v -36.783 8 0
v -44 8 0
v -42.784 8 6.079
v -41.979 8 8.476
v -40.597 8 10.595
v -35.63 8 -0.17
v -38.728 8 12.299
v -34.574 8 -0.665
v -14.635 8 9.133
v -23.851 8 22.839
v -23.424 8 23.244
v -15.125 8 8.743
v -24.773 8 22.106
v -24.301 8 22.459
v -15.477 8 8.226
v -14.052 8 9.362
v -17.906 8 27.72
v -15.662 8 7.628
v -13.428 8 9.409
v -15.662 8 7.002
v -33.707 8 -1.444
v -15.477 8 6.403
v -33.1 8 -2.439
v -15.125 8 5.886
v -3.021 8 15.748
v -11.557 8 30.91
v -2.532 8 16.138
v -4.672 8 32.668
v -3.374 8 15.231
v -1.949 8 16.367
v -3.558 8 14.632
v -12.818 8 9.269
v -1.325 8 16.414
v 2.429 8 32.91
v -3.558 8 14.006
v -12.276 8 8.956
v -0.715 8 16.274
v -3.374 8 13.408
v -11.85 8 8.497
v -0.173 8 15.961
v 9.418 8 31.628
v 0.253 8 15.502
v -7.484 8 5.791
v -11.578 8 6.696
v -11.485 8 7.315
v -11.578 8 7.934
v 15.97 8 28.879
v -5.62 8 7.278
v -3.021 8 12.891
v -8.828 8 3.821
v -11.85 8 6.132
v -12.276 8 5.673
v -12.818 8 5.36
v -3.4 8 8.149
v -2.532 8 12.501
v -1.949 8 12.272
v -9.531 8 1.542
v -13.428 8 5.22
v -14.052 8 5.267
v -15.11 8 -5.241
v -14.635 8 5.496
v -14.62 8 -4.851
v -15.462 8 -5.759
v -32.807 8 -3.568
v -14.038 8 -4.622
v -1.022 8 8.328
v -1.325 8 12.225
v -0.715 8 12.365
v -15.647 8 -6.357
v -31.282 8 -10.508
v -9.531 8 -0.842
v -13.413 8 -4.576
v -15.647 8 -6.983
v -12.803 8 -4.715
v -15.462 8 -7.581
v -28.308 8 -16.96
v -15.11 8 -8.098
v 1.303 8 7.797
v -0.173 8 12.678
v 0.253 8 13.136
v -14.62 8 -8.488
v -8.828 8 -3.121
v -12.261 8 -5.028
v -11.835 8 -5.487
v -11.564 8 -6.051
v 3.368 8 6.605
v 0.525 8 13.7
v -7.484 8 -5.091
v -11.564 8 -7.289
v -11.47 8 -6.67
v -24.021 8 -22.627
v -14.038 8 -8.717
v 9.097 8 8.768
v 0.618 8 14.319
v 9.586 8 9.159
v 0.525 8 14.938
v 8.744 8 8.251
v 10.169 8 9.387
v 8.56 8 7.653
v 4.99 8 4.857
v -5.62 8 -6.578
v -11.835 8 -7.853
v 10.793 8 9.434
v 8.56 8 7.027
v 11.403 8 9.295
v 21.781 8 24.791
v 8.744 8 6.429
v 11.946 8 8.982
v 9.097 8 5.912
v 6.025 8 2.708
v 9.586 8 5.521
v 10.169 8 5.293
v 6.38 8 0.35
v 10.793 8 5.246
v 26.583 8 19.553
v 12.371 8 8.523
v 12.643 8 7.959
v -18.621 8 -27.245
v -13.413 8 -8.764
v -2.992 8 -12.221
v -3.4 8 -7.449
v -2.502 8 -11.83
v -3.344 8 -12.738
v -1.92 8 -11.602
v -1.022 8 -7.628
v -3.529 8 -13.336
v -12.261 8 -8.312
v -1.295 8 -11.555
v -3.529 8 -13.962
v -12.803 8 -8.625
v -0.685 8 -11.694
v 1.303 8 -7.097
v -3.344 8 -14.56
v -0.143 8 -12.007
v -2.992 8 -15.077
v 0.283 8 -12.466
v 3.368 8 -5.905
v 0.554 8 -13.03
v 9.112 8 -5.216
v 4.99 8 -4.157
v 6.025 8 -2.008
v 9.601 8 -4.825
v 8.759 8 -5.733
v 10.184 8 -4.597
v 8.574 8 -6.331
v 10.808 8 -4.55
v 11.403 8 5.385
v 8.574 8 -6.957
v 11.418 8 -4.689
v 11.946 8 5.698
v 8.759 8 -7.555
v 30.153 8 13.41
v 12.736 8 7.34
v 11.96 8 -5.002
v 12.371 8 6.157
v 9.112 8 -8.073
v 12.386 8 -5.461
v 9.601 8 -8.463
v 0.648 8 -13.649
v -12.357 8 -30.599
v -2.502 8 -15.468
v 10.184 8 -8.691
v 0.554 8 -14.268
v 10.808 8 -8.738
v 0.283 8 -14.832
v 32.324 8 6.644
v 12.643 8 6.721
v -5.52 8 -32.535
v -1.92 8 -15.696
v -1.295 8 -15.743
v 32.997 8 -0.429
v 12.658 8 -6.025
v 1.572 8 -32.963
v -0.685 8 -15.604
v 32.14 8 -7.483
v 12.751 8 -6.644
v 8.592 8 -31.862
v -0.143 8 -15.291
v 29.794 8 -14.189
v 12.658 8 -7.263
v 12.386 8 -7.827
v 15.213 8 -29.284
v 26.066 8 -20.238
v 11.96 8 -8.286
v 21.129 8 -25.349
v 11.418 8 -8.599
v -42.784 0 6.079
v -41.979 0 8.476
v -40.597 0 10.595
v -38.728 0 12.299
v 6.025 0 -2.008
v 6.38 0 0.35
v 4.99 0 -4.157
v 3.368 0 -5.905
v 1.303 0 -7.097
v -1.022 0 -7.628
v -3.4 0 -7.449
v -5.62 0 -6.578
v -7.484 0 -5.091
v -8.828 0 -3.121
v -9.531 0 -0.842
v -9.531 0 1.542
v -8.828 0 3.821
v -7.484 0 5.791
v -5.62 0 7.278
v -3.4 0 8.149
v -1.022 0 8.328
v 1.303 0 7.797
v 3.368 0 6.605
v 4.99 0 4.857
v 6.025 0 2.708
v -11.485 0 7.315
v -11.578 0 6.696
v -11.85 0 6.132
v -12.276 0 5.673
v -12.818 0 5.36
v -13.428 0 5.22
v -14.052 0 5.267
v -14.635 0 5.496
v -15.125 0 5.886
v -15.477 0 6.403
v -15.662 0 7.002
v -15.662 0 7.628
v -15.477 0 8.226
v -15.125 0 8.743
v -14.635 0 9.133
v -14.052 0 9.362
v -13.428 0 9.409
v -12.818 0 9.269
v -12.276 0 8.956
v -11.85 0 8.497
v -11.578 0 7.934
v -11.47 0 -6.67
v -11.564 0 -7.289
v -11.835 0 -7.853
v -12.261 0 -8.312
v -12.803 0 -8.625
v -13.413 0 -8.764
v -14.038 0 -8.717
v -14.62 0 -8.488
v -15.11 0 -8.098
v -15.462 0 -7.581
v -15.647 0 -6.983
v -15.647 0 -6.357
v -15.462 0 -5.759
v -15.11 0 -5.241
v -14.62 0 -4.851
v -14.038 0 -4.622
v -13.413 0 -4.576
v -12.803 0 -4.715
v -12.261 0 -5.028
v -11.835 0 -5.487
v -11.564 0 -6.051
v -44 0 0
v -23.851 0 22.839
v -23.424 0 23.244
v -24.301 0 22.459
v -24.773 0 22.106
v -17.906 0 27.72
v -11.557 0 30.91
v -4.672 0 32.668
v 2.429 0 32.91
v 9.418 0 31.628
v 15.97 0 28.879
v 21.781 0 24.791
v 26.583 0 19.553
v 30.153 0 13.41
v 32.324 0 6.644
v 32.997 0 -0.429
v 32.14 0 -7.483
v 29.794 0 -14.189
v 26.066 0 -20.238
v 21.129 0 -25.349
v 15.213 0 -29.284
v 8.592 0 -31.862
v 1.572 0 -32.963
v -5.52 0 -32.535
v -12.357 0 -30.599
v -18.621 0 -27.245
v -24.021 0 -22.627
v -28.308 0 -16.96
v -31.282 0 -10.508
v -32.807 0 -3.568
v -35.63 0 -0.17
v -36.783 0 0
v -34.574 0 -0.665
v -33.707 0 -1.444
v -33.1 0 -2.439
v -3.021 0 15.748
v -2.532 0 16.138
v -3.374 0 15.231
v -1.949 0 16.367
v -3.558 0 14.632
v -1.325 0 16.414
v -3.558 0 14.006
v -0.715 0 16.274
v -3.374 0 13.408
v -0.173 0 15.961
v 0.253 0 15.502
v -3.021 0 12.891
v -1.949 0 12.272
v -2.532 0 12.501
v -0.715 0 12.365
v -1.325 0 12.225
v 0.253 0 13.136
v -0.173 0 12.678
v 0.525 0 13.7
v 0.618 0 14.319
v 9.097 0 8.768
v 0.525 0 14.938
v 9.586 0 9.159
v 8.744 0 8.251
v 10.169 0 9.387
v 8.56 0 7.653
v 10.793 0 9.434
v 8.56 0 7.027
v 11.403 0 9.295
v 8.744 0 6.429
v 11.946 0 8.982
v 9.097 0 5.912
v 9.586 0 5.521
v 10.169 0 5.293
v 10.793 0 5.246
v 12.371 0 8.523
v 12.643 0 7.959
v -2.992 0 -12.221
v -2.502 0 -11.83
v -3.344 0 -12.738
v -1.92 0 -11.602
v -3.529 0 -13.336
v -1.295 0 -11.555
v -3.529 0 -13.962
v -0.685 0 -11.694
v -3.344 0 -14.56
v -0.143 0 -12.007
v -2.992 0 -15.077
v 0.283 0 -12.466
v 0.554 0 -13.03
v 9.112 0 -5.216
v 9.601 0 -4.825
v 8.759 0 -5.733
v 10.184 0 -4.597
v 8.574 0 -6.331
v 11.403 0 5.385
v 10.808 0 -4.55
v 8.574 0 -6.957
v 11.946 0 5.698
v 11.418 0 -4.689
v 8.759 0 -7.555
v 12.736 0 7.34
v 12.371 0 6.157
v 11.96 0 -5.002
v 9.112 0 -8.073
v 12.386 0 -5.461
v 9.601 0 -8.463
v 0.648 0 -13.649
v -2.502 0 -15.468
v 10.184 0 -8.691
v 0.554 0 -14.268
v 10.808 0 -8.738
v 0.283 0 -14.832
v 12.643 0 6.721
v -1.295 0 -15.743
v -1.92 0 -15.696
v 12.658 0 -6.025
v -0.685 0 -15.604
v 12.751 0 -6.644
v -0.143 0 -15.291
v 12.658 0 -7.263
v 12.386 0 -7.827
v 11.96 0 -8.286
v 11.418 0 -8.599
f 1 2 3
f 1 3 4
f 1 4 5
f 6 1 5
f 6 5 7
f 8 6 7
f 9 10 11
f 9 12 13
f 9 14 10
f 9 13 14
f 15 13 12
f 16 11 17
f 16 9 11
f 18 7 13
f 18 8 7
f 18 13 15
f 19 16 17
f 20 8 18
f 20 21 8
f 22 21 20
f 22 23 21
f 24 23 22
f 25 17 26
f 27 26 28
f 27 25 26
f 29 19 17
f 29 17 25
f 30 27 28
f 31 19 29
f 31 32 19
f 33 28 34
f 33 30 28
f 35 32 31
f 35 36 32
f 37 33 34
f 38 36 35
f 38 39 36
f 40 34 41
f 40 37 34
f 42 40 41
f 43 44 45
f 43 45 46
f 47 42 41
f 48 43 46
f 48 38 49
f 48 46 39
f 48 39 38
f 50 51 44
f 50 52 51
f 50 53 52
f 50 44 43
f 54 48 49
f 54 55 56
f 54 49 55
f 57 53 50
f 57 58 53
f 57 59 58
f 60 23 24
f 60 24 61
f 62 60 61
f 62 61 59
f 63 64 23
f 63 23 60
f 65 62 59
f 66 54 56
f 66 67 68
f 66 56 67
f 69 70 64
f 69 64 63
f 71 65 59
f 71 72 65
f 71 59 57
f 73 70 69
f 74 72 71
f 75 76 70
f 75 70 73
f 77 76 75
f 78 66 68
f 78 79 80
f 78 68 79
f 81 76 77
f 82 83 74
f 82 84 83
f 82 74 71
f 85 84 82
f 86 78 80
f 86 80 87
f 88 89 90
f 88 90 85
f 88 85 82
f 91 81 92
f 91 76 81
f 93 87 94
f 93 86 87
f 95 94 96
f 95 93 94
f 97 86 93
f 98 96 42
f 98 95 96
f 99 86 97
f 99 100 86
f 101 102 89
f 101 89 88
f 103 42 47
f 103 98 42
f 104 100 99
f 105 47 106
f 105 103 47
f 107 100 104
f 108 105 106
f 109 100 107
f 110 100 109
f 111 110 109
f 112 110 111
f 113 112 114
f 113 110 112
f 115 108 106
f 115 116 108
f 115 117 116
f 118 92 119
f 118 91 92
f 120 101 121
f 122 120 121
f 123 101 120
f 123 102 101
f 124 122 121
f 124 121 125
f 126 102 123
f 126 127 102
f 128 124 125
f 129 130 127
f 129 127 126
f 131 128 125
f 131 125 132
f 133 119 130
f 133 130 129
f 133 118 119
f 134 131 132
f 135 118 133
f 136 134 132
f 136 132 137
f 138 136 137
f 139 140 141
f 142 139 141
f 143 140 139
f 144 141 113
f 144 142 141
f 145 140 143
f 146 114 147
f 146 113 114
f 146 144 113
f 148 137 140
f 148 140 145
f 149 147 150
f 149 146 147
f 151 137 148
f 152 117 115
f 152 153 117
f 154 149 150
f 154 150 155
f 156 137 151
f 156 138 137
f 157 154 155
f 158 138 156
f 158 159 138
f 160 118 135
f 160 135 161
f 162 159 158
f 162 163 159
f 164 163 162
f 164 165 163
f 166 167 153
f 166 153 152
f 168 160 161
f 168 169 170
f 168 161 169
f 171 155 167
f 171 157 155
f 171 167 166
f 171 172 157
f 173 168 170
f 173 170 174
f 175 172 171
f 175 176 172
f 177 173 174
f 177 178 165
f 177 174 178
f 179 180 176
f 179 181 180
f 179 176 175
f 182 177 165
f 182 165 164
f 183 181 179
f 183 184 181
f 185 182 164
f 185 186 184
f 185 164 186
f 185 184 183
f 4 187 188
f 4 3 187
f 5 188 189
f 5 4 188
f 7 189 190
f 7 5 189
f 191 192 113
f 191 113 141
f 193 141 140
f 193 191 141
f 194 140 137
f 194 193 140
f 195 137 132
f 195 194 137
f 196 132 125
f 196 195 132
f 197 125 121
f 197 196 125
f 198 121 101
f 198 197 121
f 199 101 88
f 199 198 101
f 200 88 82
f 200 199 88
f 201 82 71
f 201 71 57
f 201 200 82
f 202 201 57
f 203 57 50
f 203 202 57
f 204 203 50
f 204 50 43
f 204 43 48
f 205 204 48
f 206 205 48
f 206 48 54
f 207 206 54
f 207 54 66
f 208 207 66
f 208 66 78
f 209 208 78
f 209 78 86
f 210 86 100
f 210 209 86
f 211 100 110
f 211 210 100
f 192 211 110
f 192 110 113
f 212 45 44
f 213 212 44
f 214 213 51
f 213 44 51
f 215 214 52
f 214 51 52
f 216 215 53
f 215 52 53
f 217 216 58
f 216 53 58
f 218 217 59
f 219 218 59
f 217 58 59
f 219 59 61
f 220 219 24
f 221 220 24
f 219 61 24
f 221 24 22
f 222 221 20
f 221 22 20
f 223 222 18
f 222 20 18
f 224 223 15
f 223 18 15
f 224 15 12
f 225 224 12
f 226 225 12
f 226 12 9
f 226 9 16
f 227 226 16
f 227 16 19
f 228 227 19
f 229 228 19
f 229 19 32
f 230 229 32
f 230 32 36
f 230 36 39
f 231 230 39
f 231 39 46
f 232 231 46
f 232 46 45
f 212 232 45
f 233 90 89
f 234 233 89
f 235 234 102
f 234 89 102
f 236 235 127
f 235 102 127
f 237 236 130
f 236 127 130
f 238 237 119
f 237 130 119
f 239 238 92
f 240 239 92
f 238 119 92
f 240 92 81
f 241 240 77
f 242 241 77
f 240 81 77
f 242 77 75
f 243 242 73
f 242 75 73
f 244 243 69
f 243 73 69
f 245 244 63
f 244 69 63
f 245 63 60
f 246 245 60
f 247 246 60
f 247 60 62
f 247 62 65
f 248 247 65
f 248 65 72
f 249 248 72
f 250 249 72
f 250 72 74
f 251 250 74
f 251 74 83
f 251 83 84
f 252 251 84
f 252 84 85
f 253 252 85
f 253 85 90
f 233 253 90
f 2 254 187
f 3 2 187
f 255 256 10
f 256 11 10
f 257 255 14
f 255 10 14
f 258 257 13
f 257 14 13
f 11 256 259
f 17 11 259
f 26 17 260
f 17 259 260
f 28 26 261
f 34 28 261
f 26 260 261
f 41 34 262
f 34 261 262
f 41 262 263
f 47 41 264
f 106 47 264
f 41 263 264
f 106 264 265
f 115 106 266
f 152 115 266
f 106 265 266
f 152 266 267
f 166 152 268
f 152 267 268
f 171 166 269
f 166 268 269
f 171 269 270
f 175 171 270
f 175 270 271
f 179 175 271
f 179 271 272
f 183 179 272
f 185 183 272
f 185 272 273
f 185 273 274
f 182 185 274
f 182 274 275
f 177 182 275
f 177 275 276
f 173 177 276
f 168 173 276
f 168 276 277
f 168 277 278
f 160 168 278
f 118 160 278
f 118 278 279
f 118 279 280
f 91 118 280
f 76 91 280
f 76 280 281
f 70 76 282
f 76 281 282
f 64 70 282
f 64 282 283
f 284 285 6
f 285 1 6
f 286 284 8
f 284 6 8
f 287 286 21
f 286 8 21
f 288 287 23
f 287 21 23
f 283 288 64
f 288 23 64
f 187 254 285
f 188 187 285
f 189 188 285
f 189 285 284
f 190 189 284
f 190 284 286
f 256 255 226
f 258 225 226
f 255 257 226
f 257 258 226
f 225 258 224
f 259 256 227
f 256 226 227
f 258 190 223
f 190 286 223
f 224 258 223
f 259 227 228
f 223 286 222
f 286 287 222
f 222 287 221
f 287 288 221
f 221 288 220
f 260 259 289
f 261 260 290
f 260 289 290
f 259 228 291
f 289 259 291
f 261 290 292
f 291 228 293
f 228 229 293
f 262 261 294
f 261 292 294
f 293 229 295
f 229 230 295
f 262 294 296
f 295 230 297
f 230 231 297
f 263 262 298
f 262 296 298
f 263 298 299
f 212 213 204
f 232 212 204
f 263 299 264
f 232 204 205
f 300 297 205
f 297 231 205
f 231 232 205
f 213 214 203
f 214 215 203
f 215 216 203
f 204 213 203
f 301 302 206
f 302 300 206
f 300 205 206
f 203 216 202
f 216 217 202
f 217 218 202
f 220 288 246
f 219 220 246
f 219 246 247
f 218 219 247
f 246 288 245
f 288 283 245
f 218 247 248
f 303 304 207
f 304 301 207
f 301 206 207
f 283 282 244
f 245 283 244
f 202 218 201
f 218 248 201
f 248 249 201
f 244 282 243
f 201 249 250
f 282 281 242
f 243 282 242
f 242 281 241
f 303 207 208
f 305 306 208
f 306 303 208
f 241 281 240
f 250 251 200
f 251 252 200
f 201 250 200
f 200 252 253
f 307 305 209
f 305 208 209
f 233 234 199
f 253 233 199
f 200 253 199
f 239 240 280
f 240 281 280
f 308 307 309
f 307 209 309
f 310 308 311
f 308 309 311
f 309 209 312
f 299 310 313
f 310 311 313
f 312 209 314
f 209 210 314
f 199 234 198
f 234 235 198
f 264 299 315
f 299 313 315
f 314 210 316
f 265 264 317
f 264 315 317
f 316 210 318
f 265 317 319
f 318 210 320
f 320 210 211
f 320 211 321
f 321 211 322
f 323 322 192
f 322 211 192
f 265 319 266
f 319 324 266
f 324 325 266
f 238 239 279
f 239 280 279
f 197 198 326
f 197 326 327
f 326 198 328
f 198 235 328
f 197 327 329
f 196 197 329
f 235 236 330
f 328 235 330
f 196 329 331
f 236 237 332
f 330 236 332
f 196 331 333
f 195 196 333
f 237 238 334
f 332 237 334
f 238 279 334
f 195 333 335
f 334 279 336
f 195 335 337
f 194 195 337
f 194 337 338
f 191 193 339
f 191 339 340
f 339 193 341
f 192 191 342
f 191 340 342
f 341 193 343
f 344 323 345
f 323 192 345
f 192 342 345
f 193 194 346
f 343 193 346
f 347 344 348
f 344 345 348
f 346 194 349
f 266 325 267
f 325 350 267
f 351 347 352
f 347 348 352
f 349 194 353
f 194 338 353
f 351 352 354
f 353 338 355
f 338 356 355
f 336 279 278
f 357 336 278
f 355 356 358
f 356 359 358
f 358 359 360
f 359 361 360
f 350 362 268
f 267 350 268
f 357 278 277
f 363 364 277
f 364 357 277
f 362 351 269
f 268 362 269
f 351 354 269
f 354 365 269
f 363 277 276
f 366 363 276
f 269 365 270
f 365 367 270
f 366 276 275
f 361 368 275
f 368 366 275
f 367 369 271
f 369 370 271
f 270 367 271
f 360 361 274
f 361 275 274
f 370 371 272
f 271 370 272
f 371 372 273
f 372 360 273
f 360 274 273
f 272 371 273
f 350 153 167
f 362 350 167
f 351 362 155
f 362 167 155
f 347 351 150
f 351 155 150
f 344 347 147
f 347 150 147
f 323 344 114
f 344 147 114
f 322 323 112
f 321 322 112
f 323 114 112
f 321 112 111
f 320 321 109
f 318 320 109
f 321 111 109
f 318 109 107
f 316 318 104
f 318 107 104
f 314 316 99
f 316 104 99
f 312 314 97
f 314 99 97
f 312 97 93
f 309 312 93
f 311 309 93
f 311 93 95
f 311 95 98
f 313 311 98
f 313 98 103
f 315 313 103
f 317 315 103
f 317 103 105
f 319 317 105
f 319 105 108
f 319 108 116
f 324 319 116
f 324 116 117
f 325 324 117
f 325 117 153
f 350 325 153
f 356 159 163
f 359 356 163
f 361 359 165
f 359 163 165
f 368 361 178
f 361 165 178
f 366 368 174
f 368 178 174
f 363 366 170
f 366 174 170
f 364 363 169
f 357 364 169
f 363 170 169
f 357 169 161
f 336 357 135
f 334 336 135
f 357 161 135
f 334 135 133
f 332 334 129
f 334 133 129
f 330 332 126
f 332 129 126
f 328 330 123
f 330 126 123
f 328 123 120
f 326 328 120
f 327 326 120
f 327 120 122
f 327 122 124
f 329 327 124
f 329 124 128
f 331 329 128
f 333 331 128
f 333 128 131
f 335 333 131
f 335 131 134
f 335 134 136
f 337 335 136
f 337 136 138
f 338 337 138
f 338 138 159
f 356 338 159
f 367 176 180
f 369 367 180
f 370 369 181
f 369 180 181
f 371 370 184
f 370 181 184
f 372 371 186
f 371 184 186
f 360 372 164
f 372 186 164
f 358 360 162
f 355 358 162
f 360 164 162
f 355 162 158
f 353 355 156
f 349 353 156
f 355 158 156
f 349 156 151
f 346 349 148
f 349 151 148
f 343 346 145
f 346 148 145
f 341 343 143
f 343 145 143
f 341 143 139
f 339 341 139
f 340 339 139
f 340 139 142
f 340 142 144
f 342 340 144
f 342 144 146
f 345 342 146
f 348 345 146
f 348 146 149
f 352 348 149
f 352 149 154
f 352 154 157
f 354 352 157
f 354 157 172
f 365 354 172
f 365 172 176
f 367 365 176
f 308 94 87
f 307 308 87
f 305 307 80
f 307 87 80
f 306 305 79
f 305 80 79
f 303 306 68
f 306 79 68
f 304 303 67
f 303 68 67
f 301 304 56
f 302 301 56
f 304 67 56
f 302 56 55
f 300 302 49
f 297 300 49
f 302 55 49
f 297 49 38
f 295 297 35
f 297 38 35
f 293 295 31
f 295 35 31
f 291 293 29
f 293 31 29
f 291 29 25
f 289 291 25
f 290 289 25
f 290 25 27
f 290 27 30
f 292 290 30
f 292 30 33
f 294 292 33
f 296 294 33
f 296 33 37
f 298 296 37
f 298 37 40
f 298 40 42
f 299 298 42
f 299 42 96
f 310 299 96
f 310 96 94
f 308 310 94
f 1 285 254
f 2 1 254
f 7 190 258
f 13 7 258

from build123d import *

# Parameters (mm, degrees)
SKETCH1_R           = 8
BOSS_EXTRUDE1_DEPTH = 8
FILLET1_R           = 4
FILLET2_R           = 10
SKETCH2_R           = 2.1
CUT_EXTRUDE1_DEPTH  = 9


with BuildPart() as part:
    # Sketch1 → Boss-Extrude1 (new body)
    with BuildSketch(Plane(origin=(0, 0, 0), x_dir=(1, 0, 0), z_dir=(0, 1, 0))):
        with BuildLine():
            Line((-33, 0), (-44, 0))
            Line((-44, 0), (-42, -10))
            Line((-42, -10), (-24, -22.649503306))
            ThreePointArc((-24, -22.649503306), (30.66757245, 12.186057607), (-33, 0))
        make_face()
        with Locations((-1.62, -0.35)):
            Circle(SKETCH1_R, mode=Mode.SUBTRACT)
    extrude(amount=BOSS_EXTRUDE1_DEPTH)

    # Fillet1
    fillet1_edges = [part.edges().sort_by_distance(p)[0] for p in [
        (-33, 4, 0),
    ]]
    fillet(fillet1_edges, radius=FILLET1_R)

    # Fillet2
    fillet2_edges = [part.edges().sort_by_distance(p)[0] for p in [
        (-24, 4, 22.649503306),
        (-42, 4, 10),
    ]]
    fillet(fillet2_edges, radius=FILLET2_R)

    # Sketch2 → Cut-Extrude1 (cut, through all)
    with BuildSketch(Plane(origin=(0, 8, 0), x_dir=(1, 0, 0), z_dir=(0, 1, 0))):
        with Locations((-1.452372624, 13.648996431)):
            Circle(SKETCH2_R)
        with Locations((10.650920222, 6.644137969)):
            Circle(SKETCH2_R)
        with Locations((10.636181267, -7.340050335)):
            Circle(SKETCH2_R)
        with Locations((-1.481850533, -14.319380179)):
            Circle(SKETCH2_R)
        with Locations((-13.585143379, -7.314521718)):
            Circle(SKETCH2_R)
        with Locations((-13.570404425, 6.669666587)):
            Circle(SKETCH2_R)
    extrude(amount=-CUT_EXTRUDE1_DEPTH, mode=Mode.SUBTRACT)


solid = part.part
